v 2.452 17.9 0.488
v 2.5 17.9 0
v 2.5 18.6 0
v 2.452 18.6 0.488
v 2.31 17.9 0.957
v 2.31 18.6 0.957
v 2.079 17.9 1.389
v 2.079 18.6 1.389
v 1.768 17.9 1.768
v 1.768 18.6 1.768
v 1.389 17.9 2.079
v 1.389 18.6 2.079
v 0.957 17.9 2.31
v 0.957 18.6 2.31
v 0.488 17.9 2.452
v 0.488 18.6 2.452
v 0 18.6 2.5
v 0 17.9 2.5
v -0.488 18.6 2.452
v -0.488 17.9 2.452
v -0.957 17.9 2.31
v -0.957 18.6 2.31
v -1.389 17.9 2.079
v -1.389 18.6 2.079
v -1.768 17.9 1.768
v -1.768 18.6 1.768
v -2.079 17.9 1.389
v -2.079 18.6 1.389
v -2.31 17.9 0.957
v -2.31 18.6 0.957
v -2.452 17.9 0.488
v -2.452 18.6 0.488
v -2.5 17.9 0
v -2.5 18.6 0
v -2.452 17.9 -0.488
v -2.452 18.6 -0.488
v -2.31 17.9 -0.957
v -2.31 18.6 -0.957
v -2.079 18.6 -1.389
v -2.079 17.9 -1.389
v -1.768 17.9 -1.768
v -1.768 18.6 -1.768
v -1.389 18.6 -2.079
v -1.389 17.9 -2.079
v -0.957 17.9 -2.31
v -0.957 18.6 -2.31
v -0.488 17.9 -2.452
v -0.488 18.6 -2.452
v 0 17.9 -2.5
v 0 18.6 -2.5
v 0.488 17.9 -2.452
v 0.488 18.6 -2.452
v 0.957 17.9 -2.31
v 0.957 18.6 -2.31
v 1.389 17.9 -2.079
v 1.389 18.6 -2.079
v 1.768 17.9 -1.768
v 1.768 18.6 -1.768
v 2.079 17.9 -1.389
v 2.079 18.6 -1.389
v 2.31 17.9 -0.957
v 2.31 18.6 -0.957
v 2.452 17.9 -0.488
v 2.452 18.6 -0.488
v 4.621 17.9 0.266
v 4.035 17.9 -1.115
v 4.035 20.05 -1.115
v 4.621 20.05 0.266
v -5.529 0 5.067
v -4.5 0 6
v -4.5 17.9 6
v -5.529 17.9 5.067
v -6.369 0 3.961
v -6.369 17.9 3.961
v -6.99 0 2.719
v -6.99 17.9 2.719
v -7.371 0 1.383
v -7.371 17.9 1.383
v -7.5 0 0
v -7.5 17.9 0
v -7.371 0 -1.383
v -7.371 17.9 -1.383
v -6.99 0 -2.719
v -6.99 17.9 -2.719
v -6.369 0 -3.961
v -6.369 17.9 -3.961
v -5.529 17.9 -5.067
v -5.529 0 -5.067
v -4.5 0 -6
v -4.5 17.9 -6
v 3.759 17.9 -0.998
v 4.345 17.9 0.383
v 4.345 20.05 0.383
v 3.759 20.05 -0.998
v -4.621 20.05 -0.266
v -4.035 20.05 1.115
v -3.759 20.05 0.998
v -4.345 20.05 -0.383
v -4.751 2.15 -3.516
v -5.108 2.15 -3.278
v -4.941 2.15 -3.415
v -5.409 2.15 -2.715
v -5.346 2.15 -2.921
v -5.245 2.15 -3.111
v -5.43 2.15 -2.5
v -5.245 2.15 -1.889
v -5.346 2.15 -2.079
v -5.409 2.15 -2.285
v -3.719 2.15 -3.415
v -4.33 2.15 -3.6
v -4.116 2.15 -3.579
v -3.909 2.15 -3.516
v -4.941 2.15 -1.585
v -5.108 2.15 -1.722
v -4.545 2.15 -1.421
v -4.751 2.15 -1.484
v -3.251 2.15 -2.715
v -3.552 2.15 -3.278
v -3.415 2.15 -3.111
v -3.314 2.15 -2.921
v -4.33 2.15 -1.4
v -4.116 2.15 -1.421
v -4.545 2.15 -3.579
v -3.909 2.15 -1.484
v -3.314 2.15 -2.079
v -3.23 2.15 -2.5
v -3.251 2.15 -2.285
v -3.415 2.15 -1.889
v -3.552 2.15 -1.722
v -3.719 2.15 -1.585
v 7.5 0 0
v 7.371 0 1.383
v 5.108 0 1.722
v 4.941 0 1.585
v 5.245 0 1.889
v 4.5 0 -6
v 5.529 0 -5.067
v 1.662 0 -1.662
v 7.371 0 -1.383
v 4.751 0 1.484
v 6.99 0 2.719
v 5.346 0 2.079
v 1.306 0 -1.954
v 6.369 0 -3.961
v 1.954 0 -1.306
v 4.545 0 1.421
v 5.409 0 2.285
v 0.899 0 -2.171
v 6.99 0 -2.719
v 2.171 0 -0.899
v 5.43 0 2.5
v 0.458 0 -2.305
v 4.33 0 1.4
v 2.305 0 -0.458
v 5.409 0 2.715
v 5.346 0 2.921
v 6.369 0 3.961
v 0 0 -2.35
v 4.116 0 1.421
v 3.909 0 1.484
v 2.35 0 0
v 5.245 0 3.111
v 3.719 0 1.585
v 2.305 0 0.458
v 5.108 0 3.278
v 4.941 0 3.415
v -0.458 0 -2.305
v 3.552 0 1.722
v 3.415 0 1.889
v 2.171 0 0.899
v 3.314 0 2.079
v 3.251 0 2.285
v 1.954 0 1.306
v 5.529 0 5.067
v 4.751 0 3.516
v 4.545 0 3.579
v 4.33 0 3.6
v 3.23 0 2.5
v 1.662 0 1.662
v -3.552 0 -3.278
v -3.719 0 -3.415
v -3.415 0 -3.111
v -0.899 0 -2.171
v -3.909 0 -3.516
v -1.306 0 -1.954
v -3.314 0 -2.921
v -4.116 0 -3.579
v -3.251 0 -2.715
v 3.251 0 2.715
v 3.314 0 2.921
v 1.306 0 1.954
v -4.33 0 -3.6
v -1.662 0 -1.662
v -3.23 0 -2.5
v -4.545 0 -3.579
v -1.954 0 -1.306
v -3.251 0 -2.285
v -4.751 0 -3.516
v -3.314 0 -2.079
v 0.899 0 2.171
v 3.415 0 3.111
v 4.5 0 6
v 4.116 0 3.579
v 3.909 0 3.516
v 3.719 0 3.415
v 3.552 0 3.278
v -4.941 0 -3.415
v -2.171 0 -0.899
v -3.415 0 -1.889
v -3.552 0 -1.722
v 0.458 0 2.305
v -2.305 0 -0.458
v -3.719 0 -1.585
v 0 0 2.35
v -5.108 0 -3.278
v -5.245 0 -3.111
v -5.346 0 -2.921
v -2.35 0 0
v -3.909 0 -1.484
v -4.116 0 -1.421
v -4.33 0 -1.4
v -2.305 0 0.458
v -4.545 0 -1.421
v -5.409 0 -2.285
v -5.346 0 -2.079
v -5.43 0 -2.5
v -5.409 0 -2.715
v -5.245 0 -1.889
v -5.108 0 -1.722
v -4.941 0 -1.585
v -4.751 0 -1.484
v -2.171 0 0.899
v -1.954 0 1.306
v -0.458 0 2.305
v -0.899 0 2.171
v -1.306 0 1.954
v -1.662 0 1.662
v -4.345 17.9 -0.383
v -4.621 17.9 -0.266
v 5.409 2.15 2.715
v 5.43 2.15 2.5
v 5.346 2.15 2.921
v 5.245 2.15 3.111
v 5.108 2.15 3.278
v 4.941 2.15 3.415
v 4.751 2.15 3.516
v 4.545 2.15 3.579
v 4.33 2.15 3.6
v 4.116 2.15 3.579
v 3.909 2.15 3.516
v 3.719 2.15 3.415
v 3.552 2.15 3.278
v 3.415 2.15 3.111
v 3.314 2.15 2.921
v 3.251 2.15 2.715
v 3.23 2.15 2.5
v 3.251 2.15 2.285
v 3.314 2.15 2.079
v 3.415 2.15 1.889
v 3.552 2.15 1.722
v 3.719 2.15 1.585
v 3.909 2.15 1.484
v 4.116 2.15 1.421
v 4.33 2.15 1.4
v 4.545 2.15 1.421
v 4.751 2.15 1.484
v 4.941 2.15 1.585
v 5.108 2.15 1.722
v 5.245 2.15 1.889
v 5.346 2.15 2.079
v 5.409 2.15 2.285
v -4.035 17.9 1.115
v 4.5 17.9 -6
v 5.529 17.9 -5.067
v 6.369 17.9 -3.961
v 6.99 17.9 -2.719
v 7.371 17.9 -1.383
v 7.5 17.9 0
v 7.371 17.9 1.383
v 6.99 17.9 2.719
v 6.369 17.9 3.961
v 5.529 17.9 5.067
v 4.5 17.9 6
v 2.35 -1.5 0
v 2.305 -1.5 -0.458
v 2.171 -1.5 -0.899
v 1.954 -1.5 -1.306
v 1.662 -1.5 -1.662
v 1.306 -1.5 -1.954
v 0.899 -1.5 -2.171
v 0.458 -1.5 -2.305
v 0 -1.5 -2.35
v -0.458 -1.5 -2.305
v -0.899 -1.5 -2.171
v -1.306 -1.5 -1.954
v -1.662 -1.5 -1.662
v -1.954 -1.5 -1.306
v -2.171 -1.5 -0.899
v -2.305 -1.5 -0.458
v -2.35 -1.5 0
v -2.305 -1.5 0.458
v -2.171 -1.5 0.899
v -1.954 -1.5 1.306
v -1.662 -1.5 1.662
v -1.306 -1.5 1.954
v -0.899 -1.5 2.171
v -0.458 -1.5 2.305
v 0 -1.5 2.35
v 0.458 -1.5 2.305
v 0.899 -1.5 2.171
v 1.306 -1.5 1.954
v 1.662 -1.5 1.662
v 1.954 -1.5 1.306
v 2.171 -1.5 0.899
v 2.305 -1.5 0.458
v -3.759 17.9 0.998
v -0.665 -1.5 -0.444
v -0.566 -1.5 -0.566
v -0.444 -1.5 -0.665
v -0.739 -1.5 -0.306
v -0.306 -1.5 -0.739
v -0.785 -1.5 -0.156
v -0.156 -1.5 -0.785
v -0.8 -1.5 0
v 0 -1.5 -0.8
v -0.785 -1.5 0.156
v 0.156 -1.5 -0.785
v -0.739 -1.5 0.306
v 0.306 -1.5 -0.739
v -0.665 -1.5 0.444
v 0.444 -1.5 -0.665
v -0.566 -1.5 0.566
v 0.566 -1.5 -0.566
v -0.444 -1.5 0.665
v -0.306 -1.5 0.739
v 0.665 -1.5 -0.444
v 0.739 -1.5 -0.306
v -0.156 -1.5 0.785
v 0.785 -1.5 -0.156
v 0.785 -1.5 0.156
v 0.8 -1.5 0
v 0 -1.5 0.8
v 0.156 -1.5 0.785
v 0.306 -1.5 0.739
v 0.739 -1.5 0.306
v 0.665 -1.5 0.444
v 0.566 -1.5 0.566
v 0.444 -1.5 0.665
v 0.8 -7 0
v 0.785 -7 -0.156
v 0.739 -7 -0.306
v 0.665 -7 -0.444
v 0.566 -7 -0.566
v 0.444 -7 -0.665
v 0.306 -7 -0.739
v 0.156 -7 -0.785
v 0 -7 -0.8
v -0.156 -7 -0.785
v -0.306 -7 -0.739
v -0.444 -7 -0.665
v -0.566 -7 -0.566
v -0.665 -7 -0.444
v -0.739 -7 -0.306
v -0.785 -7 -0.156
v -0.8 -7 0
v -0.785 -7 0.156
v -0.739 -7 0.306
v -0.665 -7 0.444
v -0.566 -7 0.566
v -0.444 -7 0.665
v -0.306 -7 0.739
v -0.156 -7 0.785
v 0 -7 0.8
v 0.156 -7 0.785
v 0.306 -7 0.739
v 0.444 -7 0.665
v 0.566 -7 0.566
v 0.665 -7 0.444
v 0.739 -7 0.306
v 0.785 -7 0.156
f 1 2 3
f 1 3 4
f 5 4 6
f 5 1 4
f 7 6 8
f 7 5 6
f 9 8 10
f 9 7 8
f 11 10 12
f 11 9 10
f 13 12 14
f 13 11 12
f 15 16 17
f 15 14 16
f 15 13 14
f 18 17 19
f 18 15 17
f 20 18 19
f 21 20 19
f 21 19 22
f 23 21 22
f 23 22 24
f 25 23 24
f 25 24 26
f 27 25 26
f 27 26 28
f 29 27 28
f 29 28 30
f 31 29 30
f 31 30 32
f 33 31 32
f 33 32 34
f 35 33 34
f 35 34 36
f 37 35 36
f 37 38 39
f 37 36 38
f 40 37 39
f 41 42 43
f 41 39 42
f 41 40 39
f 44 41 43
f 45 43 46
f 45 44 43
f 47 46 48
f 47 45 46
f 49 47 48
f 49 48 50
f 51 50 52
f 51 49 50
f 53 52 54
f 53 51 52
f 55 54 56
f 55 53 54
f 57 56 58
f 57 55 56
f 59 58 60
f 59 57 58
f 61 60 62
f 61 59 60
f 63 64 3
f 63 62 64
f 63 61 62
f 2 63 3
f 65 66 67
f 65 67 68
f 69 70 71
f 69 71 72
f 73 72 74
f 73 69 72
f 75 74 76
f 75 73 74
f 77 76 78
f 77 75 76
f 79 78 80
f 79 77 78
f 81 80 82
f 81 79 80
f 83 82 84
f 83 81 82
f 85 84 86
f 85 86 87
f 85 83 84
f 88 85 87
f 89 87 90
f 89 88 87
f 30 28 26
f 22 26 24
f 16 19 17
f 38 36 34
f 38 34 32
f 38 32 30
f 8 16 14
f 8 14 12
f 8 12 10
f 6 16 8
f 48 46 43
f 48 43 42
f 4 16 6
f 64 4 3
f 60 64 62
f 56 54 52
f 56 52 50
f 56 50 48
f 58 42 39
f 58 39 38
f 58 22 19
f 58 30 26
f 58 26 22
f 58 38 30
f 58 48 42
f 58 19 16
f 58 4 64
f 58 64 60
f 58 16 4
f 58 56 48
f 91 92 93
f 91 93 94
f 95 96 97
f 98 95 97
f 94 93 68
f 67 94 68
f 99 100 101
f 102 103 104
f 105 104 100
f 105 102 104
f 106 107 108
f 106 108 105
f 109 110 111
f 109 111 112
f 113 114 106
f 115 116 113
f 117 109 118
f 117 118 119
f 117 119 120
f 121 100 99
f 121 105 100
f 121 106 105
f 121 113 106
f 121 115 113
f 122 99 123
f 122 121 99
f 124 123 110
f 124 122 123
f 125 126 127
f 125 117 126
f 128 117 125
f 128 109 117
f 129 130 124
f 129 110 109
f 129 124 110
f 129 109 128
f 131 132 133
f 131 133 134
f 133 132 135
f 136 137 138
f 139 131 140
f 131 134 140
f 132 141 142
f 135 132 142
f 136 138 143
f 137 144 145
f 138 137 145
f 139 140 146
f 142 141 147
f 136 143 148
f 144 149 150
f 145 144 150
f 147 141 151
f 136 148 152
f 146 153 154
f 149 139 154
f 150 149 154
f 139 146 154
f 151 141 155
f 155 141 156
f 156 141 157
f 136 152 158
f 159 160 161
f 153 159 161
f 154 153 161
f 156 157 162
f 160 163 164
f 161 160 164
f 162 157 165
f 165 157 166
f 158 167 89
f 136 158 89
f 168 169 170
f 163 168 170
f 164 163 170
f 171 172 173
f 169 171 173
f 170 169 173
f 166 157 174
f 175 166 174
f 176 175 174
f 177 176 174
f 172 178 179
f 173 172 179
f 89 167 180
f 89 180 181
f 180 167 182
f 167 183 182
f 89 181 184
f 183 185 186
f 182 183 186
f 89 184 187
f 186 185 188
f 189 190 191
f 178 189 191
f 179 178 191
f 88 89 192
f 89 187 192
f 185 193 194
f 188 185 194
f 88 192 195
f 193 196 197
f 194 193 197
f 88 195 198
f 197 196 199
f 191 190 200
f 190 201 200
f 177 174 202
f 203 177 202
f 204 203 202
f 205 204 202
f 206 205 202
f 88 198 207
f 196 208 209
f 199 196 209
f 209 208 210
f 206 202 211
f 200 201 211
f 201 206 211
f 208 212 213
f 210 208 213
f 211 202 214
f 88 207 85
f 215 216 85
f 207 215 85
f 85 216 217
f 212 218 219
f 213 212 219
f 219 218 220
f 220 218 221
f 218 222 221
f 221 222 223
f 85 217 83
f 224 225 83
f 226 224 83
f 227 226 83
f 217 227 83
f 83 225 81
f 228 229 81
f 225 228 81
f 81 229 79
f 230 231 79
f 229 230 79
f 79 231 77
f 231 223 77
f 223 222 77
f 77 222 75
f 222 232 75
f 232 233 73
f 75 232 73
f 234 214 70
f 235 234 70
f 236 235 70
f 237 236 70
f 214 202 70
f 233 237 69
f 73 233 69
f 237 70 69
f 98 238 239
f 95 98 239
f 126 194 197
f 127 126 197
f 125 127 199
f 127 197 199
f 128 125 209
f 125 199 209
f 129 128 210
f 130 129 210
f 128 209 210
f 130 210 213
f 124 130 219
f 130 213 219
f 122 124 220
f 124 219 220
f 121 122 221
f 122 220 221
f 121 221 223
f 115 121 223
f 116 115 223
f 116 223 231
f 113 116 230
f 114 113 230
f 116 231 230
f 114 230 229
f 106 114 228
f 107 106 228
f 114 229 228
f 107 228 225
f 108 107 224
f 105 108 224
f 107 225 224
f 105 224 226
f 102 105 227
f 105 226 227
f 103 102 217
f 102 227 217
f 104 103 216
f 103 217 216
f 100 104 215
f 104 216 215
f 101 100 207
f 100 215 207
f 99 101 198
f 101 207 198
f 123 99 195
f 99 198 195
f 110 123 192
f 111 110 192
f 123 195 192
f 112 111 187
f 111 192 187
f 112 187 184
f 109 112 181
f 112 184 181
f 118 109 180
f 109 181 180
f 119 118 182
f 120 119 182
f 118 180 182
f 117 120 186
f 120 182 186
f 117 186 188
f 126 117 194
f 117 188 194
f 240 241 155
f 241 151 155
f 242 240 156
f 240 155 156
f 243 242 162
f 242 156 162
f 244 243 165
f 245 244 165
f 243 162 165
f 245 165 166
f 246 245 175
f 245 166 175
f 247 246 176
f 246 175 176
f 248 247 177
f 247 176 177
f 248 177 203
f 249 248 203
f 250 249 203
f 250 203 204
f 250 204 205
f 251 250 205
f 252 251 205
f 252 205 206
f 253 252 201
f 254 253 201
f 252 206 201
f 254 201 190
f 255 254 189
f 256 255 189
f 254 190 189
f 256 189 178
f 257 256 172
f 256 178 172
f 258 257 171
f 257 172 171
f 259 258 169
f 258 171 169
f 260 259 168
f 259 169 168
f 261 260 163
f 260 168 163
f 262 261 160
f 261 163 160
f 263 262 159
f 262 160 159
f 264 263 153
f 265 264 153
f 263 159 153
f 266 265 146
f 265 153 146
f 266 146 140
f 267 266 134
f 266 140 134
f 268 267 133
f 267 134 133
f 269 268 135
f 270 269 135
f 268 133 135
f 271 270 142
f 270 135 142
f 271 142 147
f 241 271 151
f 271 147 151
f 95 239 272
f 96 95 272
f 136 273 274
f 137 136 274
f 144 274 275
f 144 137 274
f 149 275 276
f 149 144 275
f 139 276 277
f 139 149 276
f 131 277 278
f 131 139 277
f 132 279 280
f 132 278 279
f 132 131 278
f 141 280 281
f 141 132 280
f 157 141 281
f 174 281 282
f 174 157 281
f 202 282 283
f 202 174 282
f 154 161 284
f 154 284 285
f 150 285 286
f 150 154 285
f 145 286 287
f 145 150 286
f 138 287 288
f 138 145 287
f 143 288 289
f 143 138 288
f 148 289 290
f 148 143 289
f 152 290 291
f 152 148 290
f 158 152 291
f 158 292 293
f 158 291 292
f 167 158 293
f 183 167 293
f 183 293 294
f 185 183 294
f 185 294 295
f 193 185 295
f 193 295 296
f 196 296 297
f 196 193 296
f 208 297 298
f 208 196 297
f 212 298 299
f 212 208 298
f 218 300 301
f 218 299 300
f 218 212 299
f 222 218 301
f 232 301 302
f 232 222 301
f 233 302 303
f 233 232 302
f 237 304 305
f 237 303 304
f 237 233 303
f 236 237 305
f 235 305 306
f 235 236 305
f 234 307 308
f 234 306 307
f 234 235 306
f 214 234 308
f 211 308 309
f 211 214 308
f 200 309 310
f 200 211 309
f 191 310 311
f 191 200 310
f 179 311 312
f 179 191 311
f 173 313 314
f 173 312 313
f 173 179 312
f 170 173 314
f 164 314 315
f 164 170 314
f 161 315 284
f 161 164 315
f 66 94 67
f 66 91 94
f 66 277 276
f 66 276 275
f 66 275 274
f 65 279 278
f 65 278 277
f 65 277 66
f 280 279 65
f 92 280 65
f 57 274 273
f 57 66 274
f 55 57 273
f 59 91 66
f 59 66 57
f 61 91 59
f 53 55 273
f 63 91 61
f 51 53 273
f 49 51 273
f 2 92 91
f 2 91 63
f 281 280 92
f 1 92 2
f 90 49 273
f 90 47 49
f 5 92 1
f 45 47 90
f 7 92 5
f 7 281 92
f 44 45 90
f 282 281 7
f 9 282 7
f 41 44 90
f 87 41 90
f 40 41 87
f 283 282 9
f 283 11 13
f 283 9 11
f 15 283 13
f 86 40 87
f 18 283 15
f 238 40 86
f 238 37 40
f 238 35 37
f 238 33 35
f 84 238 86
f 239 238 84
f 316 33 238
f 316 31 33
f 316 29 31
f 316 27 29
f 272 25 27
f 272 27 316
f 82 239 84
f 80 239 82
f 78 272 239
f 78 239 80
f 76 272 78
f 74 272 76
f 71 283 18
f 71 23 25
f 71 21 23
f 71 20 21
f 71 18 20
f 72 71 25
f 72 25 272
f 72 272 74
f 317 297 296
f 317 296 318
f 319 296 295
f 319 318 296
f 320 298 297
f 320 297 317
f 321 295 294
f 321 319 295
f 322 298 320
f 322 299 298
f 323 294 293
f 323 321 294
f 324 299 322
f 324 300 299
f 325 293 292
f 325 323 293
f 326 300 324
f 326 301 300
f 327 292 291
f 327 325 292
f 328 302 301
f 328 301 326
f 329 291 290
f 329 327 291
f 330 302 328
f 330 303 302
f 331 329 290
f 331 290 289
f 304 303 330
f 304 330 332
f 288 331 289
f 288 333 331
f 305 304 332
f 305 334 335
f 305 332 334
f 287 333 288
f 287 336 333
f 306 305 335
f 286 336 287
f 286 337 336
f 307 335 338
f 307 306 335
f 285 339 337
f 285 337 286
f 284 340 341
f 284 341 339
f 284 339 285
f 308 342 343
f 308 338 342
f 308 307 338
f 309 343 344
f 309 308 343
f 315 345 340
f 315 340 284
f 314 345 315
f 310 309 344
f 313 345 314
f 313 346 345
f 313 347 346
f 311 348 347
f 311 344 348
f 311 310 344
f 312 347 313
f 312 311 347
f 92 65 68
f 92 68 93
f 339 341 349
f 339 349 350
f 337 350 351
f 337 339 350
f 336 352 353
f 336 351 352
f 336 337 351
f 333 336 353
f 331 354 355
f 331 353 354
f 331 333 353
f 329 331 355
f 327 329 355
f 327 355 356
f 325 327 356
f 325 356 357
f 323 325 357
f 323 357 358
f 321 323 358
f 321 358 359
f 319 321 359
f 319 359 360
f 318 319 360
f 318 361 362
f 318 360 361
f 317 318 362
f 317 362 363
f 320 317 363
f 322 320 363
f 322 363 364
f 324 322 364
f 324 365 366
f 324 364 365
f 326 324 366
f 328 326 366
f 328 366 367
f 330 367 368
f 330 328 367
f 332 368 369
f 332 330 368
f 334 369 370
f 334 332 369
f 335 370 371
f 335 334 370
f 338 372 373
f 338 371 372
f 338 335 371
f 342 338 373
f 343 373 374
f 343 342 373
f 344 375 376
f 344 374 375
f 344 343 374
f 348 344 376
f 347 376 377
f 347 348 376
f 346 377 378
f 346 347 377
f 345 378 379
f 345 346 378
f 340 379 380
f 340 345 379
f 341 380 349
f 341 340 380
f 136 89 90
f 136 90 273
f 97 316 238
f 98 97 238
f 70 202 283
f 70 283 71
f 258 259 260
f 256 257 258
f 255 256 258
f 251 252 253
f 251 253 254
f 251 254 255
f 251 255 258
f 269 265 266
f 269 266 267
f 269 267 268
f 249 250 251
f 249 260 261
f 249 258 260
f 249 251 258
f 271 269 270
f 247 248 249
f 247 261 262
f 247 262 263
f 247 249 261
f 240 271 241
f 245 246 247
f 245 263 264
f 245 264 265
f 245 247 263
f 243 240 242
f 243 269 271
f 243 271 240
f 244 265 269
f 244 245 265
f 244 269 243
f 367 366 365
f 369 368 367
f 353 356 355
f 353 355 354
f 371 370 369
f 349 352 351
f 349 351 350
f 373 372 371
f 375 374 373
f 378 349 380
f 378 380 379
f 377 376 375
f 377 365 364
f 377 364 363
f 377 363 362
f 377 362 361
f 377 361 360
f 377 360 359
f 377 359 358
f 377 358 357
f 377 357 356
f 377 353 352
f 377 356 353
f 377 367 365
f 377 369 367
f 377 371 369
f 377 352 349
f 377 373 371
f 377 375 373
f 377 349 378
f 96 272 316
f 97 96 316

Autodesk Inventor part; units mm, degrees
ref_plane "YZ Plane" through (0, 0, 0) normal (1, 0, 0) x (0, 1, 0)
ref_plane "XZ Plane" through (0, 0, 0) normal (0, 1, 0) x (-1, 0, 0)
ref_plane "XY Plane" through (0, 0, 0) normal (0, 0, 1) x (1, 0, 0)
sketch "Sketch1" plane through (0, 0, 0) normal (0, 1, 0) x (-1, 0, 0)
  circle A0 centre (0, 0) radius 7.5
  line L0 (10, -6) -> (-10, -6)
  line L1 (-10, -6) -> (-10, 6)
  line L2 (-10, 6) -> (10, 6)
  line L3 (10, 6) -> (10, -6)
  line L4 (10, -6) -> (-10, 6) construction
  line L5 (-10, -6) -> (10, 6) construction
  point P0 (4.5, 6)
  point P1 (-4.5, 6)
  point P2 (-4.5, -6)
  point P3 (4.5, -6)
  dimension "d0" = 15
  dimension "d1" = 12
  dimension "d2" = 20
extrude "Extrusion1" add sketch "Sketch1" along normal blind 17.9 contours A0 L0 L2
sketch "Sketch2" plane through (0, 0, 0) normal (0, -1, 0) x (1, 0, 0)
  circle A0 centre (0, 0) radius 2.35
  dimension "d5" = 4.7
extrude "Extrusion2" add sketch "Sketch2" along normal blind 1.5
sketch "Sketch3" plane through (0, -1.5, 0) normal (0, -1, 0) x (1, 0, 0)
  circle A0 centre (0, 0) radius 0.8
  dimension "d8" = 1.6
extrude "Extrusion3" add sketch "Sketch3" along normal blind 5.5
sketch "Sketch4" plane through (0, 17.9, 0) normal (0, 1, 0) x (1, 0, 0)
  circle A0 centre (0, 0) radius 0.8 projected
  circle A1 centre (0, 0) radius 2.5
  dimension "d11" = 5
extrude "Extrusion4" add sketch "Sketch4" along normal blind 0.7 contours A0 | A1
sketch "Sketch6" plane through (0, 17.9, 0) normal (0, 1, 0) x (1, 0, 0)
  line L0 (4.6211, -0.2655) -> (4.345, -0.3827)
  line L1 (4.345, -0.3827) -> (3.7589, 0.998)
  line L2 (3.7589, 0.998) -> (4.035, 1.1153)
  line L3 (4.035, 1.1153) -> (4.6211, -0.2655)
  line L4 (4.6211, -0.2655) -> (3.7589, 0.998) construction
  line L5 (4.345, -0.3827) -> (4.035, 1.1153) construction
  line L6 (-4.345, 0.3827) -> (-4.6211, 0.2655)
  line L7 (-4.6211, 0.2655) -> (-4.035, -1.1153)
  line L8 (-4.035, -1.1153) -> (-3.7589, -0.998)
  line L9 (-3.7589, -0.998) -> (-4.345, 0.3827)
  line L10 (-4.345, 0.3827) -> (-4.035, -1.1153) construction
  line L11 (-4.6211, 0.2655) -> (-3.7589, -0.998) construction
  point P0 (0, 0)
  point P1 (4.19, 0.3663)
  point P2 (-4.19, -0.3663)
  dimension "d26" = 0.3
  dimension "d27" = 1.5
  dimension "d28" = 0.3
  dimension "d29" = 1.5
  dimension "d30" = 4.19
  dimension "d31" = 4.19
  dimension "d32" = -0.3663
  dimension "d33" = -0.3663
extrude "Extrusion5" add sketch "Sketch6" along normal blind 2.15
sketch "Sketch7" plane through (0, 0, 0) normal (0, -1, 0) x (1, 0, 0)
  line L0 (-6.7346, -3.8882) -> (6.7346, 3.8882) construction
  circle A0 centre (-4.3301, -2.5) radius 1.1
  circle A1 centre (4.3301, 2.5) radius 1.1
  point P0 (0, 0)
  point P1 (0, 0)
  dimension "d36" = 2.2
  dimension "d37" = 2.2
  dimension "d38" = 5
  dimension "d39" = 5
extrude "Extrusion6" cut sketch "Sketch7" against normal blind 2.15
properties part number "Silnik"
